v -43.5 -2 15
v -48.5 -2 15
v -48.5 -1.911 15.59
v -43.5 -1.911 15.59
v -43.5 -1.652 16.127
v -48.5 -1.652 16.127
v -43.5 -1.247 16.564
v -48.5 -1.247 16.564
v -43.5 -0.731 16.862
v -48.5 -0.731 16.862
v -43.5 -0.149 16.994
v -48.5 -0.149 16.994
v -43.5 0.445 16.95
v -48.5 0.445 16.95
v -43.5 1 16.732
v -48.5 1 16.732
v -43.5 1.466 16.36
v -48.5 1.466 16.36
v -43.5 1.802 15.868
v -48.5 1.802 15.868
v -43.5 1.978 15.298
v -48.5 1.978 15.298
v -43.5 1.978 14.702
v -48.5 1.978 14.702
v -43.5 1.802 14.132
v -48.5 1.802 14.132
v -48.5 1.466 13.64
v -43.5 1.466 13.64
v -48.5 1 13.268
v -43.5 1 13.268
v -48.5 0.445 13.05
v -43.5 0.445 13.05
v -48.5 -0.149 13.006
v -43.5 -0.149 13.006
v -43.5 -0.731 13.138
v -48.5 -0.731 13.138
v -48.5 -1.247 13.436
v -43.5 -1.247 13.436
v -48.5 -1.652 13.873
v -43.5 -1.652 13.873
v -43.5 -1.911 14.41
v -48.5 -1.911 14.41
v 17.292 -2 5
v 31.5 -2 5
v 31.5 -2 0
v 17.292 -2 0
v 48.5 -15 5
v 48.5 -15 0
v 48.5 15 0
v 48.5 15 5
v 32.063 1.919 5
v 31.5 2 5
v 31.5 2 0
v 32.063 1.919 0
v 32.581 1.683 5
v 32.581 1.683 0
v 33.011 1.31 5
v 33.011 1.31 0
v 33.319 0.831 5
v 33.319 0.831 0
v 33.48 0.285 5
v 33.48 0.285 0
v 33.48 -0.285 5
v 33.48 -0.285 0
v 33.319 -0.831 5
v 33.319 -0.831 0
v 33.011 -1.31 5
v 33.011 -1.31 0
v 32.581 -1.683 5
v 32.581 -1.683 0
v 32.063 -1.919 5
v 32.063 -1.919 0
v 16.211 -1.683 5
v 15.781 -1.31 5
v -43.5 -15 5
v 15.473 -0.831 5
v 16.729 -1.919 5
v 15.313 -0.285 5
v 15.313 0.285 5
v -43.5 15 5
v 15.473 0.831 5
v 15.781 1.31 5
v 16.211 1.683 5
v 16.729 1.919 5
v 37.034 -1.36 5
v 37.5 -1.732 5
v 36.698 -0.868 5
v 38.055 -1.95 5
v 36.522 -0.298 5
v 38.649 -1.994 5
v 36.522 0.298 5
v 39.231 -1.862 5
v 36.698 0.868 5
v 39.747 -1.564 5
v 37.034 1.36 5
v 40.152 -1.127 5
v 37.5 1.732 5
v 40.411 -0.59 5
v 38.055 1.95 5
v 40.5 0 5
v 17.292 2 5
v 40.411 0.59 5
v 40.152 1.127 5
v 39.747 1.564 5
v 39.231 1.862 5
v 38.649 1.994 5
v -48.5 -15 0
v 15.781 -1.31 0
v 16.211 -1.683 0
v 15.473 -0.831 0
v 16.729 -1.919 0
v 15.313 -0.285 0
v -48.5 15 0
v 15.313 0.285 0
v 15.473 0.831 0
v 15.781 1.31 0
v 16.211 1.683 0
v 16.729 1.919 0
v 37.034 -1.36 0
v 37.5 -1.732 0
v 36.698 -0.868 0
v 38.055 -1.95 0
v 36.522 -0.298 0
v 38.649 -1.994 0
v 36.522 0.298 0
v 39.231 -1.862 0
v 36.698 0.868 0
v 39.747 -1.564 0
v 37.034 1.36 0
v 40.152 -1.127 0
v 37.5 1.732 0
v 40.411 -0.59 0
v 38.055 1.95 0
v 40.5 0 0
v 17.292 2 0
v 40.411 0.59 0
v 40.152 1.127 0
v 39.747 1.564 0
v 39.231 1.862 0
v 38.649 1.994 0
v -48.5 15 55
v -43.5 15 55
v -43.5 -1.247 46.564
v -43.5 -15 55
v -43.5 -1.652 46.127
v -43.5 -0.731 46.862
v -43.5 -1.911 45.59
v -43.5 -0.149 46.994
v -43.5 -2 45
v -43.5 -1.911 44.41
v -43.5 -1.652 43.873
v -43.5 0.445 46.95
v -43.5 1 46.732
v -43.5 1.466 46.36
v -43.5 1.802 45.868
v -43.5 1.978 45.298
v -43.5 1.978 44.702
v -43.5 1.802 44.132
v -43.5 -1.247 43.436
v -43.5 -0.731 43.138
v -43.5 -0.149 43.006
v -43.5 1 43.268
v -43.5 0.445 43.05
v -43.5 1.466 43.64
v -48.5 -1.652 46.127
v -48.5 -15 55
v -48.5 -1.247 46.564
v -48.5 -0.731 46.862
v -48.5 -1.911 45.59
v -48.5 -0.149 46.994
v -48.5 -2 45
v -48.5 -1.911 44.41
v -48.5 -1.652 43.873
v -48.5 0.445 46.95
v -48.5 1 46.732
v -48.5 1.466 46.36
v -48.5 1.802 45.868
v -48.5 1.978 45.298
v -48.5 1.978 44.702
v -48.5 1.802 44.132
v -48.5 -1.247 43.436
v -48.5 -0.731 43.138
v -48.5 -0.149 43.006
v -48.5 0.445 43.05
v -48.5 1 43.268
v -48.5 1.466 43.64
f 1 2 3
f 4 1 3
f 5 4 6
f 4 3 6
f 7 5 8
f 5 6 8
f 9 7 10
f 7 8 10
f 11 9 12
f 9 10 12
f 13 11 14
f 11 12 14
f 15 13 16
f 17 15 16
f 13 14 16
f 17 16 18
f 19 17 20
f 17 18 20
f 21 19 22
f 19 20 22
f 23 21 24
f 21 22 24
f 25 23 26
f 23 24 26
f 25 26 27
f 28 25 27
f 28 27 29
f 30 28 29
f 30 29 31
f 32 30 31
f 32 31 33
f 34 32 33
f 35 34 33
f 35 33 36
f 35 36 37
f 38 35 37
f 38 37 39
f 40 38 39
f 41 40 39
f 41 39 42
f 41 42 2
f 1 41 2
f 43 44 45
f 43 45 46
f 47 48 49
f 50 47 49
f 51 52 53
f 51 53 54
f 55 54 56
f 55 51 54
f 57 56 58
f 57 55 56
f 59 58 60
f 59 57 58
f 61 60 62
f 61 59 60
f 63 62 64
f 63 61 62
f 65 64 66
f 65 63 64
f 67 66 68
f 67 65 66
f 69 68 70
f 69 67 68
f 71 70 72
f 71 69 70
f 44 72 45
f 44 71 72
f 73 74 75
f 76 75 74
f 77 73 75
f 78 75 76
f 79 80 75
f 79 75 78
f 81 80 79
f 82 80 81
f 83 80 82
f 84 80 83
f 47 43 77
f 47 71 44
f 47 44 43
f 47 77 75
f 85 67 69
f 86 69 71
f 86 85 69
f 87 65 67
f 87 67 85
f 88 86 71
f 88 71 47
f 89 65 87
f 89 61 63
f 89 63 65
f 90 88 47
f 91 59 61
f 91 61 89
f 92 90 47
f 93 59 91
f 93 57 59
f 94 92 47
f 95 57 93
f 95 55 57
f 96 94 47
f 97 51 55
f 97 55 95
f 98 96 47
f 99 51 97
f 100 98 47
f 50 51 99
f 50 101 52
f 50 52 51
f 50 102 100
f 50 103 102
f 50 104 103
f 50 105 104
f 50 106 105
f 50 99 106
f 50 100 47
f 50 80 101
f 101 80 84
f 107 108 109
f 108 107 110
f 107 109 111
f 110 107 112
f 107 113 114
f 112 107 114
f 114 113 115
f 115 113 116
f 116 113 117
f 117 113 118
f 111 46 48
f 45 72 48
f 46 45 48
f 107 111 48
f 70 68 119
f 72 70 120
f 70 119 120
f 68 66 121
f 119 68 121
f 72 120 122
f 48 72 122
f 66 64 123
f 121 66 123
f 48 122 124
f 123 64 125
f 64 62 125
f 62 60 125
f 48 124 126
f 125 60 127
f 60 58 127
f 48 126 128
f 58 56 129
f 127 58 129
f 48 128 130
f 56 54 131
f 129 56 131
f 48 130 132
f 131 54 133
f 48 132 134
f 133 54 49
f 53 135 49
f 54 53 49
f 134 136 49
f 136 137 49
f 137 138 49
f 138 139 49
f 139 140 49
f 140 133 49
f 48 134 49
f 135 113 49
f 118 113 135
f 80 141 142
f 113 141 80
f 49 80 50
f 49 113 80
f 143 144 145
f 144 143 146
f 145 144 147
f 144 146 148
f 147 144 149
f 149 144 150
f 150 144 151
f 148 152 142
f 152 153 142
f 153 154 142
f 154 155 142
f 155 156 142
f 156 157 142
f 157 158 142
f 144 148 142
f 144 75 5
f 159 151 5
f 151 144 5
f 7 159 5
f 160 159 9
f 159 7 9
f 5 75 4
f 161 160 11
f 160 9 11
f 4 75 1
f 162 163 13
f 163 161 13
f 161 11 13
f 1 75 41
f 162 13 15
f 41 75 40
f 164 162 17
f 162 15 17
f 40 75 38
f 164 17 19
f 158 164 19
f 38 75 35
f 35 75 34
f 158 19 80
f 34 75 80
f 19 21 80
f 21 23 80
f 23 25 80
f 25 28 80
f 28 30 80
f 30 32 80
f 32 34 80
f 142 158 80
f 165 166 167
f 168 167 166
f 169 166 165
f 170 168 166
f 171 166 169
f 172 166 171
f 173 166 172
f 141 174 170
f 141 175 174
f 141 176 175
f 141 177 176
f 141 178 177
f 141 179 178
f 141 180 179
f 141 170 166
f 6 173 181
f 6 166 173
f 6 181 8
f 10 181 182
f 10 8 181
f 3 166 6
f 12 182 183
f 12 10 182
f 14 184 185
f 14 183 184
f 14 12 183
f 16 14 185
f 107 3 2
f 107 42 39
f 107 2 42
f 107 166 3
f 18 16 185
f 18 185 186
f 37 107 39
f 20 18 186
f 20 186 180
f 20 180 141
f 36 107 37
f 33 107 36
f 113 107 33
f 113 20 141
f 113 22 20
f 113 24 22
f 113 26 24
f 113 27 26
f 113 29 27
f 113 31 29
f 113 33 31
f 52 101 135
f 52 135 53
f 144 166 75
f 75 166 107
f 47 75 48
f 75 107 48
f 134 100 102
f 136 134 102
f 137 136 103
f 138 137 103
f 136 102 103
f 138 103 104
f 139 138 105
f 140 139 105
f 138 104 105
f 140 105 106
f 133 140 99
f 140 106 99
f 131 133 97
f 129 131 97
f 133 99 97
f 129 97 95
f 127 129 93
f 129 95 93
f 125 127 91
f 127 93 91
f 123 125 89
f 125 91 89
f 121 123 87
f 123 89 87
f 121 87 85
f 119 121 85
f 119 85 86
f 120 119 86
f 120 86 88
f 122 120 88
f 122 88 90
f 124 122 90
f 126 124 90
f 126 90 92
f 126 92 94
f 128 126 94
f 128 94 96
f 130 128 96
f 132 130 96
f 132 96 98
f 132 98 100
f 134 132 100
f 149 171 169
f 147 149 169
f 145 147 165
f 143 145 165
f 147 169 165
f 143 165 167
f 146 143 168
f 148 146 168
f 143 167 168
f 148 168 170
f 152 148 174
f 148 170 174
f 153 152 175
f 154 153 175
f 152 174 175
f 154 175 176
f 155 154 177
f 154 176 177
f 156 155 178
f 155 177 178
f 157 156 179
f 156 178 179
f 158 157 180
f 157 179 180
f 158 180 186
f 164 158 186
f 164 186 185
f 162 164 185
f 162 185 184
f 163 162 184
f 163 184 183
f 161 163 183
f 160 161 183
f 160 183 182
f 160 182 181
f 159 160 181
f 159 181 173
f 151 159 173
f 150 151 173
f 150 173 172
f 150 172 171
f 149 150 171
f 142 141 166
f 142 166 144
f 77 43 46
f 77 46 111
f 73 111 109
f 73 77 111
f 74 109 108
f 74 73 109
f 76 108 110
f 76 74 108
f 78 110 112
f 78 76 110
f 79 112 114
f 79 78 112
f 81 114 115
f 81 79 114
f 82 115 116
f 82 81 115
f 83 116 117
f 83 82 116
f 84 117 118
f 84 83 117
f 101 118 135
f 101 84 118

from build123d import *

# Parameters (mm, degrees)
SKETCH1_W           = 97
SKETCH1_H           = 30
BOSS_EXTRUDE1_DEPTH = 5
SKETCH2_R           = 2
CUT_EXTRUDE1_DEPTH  = 52.01225343
SKETCH3_W           = 5
SKETCH3_H           = 30
BOSS_EXTRUDE2_DEPTH = 50
SKETCH4_R           = 2
CUT_EXTRUDE2_DEPTH  = 113.512221558


with BuildPart() as part:
    # Sketch1 → Boss-Extrude1 (new body)
    with BuildSketch(Plane.XY):
        Rectangle(SKETCH1_W, SKETCH1_H)
    extrude(amount=BOSS_EXTRUDE1_DEPTH)

    # Sketch2 → Cut-Extrude1 (cut, through all)
    with BuildSketch(Plane.XY.offset(5)):
        with Locations((38.5, 0)):
            Circle(SKETCH2_R)
        with BuildLine():
            Line((17.292206758, 2), (31.5, 2))
            ThreePointArc((31.5, 2), (33.5, 0), (31.5, -2))
            Line((31.5, -2), (17.292206758, -2))
            ThreePointArc((17.292206758, -2), (15.292206758, 0), (17.292206758, 2))
        make_face()
    extrude(amount=-CUT_EXTRUDE1_DEPTH, mode=Mode.SUBTRACT)

    # Sketch3 → Boss-Extrude2 (add)
    with BuildSketch(Plane.XY.offset(5)):
        with Locations((-46, 0)):
            Rectangle(SKETCH3_W, SKETCH3_H)
    extrude(amount=BOSS_EXTRUDE2_DEPTH)

    # Sketch4 → Cut-Extrude2 (cut, through all)
    with BuildSketch(Plane.ZY.offset(48.5)):
        with Locations(Location((15, 0, 0), (0, 0, 270))):
            Circle(SKETCH4_R)
        with Locations(Location((45, 0, 0), (0, 0, 270))):
            Circle(SKETCH4_R)
    extrude(amount=-CUT_EXTRUDE2_DEPTH, mode=Mode.SUBTRACT)


solid = part.part
